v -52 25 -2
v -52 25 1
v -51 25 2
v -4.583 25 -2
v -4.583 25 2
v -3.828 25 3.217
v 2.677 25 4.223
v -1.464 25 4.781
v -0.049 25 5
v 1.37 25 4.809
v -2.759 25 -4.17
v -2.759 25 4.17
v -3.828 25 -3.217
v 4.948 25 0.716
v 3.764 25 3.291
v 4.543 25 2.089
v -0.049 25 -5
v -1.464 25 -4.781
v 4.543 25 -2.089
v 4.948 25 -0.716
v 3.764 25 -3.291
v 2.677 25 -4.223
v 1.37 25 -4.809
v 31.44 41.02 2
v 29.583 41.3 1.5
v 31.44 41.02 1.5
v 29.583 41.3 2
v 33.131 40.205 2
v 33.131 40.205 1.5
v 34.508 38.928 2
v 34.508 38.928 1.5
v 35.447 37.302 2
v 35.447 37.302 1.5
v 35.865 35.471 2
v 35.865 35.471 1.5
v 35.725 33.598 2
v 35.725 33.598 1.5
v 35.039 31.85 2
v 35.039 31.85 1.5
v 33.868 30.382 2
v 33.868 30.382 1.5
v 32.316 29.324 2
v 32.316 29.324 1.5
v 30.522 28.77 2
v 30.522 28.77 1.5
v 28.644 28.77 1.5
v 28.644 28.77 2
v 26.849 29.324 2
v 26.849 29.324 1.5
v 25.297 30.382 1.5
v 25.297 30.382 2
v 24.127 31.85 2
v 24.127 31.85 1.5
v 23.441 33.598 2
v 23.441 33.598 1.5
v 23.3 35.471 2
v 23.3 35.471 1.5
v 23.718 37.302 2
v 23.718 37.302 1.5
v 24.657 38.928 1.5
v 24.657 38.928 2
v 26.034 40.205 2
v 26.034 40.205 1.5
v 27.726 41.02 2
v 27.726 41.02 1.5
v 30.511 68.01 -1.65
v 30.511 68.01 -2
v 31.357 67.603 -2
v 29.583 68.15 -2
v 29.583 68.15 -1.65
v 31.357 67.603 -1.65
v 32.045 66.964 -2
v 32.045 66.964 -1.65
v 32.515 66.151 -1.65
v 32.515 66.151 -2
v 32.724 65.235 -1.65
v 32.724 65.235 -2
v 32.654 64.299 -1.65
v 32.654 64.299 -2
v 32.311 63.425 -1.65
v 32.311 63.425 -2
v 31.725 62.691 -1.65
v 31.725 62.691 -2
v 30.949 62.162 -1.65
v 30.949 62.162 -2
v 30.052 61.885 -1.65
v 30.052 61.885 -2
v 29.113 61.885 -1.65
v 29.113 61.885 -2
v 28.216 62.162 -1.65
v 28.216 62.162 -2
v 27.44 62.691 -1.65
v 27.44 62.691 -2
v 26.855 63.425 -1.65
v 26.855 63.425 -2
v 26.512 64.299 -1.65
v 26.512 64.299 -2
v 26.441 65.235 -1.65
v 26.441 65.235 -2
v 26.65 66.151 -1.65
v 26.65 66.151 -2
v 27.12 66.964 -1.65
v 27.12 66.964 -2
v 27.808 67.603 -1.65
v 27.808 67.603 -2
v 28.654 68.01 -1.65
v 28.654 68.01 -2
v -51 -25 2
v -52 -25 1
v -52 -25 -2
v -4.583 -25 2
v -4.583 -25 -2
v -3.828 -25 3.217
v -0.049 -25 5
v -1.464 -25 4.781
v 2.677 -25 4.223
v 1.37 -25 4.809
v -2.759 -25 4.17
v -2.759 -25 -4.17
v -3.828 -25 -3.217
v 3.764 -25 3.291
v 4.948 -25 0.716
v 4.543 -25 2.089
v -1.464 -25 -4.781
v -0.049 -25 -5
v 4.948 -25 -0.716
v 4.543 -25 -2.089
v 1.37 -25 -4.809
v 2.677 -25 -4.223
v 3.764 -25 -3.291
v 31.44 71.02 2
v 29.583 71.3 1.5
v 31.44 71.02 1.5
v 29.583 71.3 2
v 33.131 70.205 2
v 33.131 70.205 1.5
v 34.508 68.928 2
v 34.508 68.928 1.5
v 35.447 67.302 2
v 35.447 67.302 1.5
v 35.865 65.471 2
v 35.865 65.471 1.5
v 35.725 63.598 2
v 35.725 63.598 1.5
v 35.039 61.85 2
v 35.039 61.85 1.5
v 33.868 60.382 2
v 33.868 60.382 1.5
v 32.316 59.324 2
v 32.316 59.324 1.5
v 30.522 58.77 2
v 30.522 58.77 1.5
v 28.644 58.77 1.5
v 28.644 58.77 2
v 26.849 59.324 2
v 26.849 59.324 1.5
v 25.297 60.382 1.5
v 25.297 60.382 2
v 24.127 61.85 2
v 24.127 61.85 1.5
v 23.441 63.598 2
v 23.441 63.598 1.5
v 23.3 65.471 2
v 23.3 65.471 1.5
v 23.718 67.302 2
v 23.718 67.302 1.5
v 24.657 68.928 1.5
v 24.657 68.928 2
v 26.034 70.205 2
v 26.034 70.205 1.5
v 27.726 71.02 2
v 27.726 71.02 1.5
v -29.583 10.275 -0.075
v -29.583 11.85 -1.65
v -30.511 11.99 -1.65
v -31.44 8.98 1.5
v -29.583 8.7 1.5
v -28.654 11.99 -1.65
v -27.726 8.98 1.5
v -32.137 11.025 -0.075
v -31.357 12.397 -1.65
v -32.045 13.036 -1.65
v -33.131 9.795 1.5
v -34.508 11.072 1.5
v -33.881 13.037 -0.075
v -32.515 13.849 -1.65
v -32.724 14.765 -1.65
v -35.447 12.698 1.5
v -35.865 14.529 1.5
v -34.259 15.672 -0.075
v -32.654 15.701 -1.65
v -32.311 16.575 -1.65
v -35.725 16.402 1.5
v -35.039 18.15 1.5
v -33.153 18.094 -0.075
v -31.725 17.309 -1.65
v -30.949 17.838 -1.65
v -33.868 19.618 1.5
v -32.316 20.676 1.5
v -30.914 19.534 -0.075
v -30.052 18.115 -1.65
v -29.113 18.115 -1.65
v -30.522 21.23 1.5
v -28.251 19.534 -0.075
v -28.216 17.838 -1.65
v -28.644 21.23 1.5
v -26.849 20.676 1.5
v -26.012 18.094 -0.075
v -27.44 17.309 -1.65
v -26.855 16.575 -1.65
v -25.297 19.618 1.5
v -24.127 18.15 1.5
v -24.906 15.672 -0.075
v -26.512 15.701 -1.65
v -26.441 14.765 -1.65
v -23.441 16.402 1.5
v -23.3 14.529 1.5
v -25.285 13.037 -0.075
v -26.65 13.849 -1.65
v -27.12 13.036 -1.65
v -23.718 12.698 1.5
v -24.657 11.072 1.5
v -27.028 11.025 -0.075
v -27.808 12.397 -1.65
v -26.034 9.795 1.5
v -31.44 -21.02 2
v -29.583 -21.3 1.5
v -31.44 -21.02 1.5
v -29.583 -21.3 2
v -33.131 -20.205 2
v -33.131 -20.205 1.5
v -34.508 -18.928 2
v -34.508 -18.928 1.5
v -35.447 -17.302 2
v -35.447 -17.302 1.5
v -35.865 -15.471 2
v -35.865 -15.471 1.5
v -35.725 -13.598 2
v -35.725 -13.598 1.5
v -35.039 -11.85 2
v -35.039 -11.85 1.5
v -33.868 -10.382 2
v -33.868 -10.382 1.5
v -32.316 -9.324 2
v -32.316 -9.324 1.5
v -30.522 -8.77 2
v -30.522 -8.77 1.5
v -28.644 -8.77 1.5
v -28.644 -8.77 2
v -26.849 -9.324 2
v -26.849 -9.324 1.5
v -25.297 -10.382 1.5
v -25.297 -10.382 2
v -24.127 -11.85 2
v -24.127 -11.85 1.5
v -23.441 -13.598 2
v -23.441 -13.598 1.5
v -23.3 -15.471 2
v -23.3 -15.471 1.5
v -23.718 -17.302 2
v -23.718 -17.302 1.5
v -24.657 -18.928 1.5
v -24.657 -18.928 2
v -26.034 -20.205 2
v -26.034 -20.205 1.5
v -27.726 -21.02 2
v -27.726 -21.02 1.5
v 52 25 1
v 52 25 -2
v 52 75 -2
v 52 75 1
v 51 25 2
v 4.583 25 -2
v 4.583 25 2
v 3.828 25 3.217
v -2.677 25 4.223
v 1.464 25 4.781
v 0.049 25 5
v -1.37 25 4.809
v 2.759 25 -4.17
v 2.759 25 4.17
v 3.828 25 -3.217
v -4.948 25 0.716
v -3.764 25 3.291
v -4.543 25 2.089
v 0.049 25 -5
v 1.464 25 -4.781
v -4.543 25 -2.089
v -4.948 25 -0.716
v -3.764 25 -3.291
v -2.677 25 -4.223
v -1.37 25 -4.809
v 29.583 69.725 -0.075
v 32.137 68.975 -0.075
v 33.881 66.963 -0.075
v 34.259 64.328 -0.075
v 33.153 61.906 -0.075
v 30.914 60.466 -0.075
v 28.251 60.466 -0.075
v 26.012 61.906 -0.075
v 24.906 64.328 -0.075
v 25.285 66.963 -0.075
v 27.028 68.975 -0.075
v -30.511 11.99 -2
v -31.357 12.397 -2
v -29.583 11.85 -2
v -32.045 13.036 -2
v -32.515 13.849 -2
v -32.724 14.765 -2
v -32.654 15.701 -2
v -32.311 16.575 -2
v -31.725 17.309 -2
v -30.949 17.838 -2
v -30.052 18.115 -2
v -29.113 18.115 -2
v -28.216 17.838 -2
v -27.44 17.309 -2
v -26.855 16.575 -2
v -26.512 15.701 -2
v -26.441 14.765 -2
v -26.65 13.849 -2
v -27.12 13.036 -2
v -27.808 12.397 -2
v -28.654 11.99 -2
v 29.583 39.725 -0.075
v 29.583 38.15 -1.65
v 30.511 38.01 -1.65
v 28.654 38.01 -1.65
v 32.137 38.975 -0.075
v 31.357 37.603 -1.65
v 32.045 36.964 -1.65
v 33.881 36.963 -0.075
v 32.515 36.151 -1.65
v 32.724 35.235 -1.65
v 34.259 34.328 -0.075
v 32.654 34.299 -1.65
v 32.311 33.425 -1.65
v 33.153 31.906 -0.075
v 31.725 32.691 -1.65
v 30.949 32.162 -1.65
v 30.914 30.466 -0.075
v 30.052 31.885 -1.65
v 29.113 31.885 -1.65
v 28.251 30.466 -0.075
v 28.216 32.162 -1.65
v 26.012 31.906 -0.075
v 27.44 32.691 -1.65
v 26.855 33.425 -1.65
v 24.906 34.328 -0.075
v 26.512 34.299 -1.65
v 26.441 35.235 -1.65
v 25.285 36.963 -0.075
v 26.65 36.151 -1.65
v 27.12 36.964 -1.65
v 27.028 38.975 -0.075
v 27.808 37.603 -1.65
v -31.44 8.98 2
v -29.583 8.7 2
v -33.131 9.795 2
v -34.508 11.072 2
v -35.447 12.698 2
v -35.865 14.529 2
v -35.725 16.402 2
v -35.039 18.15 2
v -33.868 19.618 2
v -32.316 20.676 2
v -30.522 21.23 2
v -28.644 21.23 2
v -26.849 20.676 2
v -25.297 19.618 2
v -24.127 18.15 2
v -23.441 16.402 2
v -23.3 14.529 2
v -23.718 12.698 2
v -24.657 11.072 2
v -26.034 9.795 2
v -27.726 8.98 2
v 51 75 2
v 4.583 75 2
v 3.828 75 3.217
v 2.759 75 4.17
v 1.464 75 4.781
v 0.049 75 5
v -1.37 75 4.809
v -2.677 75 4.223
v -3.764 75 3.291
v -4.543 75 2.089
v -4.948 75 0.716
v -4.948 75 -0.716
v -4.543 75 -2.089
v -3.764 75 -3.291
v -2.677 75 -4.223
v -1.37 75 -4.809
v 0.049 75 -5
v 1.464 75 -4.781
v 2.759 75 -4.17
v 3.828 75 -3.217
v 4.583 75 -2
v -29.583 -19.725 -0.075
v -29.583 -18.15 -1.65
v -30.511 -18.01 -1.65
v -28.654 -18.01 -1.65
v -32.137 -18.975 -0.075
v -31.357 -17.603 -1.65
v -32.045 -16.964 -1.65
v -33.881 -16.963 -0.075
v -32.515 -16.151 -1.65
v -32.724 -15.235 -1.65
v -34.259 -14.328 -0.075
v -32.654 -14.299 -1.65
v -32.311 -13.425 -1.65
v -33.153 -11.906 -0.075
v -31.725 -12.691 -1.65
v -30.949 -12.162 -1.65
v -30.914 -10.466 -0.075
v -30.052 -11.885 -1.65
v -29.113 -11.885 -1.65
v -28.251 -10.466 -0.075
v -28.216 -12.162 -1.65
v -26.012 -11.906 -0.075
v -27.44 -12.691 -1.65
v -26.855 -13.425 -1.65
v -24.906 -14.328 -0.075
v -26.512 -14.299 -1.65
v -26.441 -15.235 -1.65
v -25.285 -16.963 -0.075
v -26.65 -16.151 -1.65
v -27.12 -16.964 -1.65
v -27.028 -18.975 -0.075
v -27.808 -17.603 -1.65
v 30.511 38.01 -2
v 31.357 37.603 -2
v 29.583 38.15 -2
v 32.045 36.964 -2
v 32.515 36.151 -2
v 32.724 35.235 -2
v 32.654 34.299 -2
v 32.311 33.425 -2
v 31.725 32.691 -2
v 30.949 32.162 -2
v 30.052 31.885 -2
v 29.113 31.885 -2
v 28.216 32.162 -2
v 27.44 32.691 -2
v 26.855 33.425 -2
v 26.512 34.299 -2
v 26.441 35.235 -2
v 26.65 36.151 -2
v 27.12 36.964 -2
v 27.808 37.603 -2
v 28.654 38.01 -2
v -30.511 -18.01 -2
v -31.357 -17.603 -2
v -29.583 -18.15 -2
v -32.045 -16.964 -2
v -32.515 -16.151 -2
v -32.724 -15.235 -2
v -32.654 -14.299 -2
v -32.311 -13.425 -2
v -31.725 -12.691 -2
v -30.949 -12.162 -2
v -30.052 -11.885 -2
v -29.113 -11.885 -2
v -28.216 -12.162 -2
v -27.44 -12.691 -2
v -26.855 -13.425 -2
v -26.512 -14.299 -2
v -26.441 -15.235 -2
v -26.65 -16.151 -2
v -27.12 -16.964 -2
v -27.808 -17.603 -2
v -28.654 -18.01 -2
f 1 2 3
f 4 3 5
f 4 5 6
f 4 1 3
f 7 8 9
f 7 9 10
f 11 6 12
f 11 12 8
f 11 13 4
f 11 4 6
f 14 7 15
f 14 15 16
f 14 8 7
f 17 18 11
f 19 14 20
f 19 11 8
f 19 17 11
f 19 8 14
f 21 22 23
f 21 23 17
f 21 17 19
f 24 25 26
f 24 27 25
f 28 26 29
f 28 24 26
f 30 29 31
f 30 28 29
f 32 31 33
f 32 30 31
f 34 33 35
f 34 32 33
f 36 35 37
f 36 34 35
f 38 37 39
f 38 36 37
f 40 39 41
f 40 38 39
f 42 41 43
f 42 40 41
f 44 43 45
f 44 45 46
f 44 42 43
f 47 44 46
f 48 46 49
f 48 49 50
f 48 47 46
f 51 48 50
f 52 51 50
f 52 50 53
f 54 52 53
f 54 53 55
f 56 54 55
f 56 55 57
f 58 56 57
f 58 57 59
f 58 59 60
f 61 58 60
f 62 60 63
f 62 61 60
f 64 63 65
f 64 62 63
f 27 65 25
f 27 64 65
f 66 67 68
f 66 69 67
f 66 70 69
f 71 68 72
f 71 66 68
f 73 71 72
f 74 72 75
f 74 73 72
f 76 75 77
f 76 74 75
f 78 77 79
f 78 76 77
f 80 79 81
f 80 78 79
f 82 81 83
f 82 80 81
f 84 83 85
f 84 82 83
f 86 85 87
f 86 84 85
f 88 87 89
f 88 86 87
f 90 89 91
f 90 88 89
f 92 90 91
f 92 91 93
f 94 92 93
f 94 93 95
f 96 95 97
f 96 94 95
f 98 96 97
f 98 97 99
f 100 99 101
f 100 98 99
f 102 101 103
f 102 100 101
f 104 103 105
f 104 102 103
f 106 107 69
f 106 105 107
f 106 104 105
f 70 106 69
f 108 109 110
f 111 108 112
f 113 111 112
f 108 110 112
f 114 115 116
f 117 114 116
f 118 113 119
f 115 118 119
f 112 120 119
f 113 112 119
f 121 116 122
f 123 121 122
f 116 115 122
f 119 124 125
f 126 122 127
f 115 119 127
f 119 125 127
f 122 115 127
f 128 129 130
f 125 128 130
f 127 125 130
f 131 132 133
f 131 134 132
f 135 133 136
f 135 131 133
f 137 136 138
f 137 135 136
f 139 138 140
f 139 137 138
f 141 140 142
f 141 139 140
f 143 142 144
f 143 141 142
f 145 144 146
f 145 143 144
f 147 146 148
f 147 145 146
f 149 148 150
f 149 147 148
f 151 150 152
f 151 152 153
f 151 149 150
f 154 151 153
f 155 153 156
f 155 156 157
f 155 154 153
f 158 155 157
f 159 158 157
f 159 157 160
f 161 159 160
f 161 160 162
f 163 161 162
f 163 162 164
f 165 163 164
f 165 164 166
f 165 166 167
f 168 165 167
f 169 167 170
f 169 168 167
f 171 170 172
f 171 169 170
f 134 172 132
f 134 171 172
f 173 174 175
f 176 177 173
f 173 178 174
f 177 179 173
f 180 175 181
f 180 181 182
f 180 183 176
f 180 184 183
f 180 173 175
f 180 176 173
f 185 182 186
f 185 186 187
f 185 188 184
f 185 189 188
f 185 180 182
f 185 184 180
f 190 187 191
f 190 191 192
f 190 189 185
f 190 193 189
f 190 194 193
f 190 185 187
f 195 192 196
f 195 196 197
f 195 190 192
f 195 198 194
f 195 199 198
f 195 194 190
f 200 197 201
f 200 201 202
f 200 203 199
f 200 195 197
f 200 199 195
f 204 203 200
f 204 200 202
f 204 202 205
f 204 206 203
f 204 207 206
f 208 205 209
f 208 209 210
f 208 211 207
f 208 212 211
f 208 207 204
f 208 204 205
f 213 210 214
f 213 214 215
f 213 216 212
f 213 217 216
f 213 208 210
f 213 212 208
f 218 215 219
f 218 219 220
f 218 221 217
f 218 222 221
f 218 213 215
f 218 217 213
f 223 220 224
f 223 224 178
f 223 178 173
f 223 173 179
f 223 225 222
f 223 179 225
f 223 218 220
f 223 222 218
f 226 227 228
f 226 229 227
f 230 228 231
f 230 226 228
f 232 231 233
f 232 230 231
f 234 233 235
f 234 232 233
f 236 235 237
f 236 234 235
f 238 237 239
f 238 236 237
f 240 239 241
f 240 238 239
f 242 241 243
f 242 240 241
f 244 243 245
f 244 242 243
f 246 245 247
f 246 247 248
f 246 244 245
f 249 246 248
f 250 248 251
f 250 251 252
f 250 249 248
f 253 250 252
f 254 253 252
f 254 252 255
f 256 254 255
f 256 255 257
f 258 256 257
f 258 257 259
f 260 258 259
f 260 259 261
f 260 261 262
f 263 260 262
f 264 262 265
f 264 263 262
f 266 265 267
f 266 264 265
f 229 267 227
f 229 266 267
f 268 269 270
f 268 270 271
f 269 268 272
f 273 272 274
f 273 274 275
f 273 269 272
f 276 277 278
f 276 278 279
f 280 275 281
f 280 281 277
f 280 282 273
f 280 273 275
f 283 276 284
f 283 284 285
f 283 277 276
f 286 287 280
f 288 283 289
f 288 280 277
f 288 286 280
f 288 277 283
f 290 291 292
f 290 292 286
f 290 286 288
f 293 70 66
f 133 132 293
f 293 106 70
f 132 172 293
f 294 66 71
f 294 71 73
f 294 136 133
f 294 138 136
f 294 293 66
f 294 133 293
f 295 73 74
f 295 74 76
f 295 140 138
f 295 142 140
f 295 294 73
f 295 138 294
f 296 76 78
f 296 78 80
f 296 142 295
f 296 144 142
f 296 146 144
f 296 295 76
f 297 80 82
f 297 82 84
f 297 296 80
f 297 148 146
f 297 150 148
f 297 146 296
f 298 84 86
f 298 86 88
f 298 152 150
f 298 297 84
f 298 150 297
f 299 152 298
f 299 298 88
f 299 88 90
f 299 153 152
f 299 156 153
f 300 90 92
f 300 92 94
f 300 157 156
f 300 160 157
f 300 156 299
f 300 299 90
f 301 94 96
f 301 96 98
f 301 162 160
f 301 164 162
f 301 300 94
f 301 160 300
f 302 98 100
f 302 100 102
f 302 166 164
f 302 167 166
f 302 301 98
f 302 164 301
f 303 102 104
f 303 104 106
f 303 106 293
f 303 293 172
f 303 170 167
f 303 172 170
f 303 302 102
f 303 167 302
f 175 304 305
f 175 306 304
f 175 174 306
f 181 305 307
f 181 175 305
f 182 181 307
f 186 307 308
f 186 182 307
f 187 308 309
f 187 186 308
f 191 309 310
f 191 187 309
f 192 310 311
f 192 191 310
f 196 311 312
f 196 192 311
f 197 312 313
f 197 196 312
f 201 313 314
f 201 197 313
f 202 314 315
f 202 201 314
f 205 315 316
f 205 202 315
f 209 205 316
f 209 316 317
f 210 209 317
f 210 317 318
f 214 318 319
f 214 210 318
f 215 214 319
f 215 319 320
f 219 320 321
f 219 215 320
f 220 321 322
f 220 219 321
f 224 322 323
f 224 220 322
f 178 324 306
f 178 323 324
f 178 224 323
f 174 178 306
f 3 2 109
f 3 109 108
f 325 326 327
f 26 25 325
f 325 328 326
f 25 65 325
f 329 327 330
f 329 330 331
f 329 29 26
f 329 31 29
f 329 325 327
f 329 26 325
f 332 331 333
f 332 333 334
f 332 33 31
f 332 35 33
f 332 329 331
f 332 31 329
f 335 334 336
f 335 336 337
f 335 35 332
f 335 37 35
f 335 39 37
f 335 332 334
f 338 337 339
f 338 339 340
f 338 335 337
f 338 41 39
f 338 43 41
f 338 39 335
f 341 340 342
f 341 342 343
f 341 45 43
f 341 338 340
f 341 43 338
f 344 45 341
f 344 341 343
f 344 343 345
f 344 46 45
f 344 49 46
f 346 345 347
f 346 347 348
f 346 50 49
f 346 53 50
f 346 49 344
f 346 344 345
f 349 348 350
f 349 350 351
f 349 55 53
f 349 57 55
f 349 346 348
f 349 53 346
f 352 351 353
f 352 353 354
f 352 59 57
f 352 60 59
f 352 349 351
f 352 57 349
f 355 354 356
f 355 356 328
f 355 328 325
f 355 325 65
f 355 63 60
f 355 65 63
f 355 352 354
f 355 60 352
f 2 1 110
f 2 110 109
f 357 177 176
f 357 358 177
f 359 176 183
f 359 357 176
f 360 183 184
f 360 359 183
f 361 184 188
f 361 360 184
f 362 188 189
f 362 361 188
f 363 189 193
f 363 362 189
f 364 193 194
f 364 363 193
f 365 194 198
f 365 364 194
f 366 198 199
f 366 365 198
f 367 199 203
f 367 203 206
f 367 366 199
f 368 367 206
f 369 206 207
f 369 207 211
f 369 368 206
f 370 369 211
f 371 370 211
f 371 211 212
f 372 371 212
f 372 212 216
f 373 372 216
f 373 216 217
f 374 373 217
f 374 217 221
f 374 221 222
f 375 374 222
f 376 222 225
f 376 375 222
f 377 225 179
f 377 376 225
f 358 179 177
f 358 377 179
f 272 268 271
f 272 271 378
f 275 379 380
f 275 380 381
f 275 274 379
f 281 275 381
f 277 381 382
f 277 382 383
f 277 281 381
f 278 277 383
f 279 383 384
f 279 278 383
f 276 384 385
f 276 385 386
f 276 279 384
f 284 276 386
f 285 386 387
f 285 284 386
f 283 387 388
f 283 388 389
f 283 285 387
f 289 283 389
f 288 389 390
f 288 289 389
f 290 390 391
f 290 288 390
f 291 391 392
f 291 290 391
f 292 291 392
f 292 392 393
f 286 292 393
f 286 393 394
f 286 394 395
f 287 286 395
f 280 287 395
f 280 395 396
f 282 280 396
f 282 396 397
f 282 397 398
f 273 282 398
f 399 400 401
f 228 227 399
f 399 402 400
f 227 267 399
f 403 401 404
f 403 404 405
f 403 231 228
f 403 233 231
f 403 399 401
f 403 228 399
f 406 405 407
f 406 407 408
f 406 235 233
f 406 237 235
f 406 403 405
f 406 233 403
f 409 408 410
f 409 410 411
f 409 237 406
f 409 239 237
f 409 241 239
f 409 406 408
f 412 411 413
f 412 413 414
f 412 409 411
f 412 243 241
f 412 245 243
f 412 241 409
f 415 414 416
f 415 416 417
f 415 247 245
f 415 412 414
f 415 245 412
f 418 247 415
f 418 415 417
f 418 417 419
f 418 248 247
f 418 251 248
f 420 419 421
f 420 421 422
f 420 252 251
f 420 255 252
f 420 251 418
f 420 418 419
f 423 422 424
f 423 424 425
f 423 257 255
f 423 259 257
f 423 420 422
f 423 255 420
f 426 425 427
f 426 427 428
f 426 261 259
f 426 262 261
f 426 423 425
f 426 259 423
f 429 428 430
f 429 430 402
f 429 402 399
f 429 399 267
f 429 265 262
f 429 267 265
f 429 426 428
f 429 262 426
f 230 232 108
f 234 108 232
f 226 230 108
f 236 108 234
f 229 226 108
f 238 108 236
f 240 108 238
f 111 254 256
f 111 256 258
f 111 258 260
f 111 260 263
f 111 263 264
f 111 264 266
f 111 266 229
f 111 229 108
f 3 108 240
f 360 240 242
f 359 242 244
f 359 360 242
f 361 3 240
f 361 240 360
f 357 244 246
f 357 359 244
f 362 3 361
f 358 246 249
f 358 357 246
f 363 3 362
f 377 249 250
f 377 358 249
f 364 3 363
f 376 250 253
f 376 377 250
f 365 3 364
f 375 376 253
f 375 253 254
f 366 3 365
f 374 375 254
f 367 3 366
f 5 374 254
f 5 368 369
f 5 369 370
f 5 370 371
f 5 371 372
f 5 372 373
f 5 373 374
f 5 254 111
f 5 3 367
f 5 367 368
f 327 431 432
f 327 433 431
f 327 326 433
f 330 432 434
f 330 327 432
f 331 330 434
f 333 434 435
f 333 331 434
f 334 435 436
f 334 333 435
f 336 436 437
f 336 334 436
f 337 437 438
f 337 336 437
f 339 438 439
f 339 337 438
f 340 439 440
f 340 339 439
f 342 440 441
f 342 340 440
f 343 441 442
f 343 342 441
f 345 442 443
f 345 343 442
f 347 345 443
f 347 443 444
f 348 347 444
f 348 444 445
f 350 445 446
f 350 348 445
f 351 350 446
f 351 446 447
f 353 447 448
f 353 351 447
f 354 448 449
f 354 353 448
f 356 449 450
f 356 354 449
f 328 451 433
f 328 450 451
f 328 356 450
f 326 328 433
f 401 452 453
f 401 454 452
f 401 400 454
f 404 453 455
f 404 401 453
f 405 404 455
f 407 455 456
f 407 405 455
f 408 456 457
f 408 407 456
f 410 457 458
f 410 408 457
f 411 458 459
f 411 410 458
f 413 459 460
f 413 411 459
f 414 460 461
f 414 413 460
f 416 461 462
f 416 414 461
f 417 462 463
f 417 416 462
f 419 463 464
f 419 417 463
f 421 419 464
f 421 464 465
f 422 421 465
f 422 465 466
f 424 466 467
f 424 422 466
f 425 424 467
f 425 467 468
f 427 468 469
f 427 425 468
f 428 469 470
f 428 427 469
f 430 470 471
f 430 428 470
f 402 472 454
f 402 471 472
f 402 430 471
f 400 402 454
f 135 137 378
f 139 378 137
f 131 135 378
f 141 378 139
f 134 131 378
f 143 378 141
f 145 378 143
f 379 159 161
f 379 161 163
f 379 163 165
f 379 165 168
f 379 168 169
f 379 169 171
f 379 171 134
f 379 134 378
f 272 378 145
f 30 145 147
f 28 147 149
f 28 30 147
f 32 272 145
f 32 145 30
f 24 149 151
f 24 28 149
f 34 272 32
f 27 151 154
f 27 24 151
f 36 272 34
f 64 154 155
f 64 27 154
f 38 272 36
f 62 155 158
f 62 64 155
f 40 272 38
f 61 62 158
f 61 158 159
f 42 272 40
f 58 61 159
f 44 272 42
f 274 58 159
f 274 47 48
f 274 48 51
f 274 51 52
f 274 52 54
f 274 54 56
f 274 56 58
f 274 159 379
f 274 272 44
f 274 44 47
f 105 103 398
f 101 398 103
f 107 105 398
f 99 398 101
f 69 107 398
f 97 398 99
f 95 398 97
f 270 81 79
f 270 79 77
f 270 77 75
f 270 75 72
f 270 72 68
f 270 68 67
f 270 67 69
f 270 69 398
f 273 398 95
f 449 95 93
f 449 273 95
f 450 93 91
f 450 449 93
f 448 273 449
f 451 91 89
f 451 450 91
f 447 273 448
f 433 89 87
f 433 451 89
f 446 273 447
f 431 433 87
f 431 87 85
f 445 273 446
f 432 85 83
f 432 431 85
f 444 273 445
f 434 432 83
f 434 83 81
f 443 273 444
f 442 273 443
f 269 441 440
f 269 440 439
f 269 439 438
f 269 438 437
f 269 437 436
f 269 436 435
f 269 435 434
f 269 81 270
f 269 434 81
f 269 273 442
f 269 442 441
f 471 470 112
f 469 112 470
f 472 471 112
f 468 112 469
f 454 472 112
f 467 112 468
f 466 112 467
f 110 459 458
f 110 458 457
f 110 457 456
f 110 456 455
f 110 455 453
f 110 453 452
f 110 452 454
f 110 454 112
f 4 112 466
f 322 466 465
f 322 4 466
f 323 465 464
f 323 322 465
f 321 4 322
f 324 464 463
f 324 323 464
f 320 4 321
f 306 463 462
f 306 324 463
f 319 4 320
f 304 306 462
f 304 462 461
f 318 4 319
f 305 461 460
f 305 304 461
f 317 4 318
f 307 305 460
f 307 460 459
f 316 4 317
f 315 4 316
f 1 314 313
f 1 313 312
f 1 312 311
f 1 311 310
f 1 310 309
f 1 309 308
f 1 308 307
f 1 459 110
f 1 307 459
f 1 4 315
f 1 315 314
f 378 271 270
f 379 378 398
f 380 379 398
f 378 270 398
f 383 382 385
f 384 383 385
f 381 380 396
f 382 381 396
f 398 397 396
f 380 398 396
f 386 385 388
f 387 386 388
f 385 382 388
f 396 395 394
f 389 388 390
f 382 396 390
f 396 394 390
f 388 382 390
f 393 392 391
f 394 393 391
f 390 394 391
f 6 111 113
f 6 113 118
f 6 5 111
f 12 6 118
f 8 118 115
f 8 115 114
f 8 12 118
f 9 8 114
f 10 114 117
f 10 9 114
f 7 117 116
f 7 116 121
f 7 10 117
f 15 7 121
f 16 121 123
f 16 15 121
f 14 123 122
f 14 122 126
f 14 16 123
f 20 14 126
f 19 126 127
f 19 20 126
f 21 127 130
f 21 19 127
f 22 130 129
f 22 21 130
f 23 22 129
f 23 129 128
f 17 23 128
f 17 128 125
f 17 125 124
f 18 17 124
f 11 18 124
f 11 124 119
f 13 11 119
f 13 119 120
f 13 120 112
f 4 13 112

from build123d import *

# Parameters (mm, degrees)
EXTRUDE_1_DEPTH            = 25
HOLE_WIZARD_M61_AT_2_COUNT = 2
HOLE_WIZARD_M61_AT_2_PITCH = 30
PATTERN_CIRCULAR_1_COUNT   = 2


with BuildPart() as part:
    # Эскиз1 → Бобышка-Вытянуть1 (new body, symmetric)
    with BuildSketch(Plane(origin=(0, 0, 0), x_dir=(1, 0, 0), z_dir=(0, 1, 0))):
        with BuildLine():
            Line((-4.582575695, 2), (-52, 2))
            Line((-52, 2), (-52, -1))
            Line((-52, -1), (-51, -2))
            Line((-51, -2), (-4.582575695, -2))
            ThreePointArc((-4.582575695, -2), (5, 0), (-4.582575695, 2))
        make_face()
    extrude(amount=EXTRUDE_1_DEPTH, both=True)

    # Эскиз6 → Зенковка для винта с полупотайной головкой M61 (revolve, cut)
    with BuildSketch(Plane(origin=(-29.582575695, 15, 2), x_dir=(0, -1, 0), z_dir=(1, 0, 0))):
        Polygon((0, 0), (0, 7), (3.15, 7), (3.15, 3.65), (6.3, 0.5), (6.3, 0), align=None)
    hole_wizard_m61 = revolve(axis=Axis((-29.582575695, 15, 8.35), (0, 0, -1)), mode=Mode.SUBTRACT)

    # Зенковка для винта с полупотайной головкой M61 at 2: Зенковка для винта с полупотайной головкой M61 ×2
    with Locations(*[(0, -i * HOLE_WIZARD_M61_AT_2_PITCH, 0) for i in range(1, HOLE_WIZARD_M61_AT_2_COUNT)]):
        add(hole_wizard_m61, mode=Mode.SUBTRACT)


with BuildPart() as pattern_circular_1_1:
    # Круговой массив1: pattern copy
    add(part.part.rotate(Axis((0, 25, 0), (0, 0, 1)), 1 * 360 / PATTERN_CIRCULAR_1_COUNT))


solid = Compound([part.part, pattern_circular_1_1.part])
